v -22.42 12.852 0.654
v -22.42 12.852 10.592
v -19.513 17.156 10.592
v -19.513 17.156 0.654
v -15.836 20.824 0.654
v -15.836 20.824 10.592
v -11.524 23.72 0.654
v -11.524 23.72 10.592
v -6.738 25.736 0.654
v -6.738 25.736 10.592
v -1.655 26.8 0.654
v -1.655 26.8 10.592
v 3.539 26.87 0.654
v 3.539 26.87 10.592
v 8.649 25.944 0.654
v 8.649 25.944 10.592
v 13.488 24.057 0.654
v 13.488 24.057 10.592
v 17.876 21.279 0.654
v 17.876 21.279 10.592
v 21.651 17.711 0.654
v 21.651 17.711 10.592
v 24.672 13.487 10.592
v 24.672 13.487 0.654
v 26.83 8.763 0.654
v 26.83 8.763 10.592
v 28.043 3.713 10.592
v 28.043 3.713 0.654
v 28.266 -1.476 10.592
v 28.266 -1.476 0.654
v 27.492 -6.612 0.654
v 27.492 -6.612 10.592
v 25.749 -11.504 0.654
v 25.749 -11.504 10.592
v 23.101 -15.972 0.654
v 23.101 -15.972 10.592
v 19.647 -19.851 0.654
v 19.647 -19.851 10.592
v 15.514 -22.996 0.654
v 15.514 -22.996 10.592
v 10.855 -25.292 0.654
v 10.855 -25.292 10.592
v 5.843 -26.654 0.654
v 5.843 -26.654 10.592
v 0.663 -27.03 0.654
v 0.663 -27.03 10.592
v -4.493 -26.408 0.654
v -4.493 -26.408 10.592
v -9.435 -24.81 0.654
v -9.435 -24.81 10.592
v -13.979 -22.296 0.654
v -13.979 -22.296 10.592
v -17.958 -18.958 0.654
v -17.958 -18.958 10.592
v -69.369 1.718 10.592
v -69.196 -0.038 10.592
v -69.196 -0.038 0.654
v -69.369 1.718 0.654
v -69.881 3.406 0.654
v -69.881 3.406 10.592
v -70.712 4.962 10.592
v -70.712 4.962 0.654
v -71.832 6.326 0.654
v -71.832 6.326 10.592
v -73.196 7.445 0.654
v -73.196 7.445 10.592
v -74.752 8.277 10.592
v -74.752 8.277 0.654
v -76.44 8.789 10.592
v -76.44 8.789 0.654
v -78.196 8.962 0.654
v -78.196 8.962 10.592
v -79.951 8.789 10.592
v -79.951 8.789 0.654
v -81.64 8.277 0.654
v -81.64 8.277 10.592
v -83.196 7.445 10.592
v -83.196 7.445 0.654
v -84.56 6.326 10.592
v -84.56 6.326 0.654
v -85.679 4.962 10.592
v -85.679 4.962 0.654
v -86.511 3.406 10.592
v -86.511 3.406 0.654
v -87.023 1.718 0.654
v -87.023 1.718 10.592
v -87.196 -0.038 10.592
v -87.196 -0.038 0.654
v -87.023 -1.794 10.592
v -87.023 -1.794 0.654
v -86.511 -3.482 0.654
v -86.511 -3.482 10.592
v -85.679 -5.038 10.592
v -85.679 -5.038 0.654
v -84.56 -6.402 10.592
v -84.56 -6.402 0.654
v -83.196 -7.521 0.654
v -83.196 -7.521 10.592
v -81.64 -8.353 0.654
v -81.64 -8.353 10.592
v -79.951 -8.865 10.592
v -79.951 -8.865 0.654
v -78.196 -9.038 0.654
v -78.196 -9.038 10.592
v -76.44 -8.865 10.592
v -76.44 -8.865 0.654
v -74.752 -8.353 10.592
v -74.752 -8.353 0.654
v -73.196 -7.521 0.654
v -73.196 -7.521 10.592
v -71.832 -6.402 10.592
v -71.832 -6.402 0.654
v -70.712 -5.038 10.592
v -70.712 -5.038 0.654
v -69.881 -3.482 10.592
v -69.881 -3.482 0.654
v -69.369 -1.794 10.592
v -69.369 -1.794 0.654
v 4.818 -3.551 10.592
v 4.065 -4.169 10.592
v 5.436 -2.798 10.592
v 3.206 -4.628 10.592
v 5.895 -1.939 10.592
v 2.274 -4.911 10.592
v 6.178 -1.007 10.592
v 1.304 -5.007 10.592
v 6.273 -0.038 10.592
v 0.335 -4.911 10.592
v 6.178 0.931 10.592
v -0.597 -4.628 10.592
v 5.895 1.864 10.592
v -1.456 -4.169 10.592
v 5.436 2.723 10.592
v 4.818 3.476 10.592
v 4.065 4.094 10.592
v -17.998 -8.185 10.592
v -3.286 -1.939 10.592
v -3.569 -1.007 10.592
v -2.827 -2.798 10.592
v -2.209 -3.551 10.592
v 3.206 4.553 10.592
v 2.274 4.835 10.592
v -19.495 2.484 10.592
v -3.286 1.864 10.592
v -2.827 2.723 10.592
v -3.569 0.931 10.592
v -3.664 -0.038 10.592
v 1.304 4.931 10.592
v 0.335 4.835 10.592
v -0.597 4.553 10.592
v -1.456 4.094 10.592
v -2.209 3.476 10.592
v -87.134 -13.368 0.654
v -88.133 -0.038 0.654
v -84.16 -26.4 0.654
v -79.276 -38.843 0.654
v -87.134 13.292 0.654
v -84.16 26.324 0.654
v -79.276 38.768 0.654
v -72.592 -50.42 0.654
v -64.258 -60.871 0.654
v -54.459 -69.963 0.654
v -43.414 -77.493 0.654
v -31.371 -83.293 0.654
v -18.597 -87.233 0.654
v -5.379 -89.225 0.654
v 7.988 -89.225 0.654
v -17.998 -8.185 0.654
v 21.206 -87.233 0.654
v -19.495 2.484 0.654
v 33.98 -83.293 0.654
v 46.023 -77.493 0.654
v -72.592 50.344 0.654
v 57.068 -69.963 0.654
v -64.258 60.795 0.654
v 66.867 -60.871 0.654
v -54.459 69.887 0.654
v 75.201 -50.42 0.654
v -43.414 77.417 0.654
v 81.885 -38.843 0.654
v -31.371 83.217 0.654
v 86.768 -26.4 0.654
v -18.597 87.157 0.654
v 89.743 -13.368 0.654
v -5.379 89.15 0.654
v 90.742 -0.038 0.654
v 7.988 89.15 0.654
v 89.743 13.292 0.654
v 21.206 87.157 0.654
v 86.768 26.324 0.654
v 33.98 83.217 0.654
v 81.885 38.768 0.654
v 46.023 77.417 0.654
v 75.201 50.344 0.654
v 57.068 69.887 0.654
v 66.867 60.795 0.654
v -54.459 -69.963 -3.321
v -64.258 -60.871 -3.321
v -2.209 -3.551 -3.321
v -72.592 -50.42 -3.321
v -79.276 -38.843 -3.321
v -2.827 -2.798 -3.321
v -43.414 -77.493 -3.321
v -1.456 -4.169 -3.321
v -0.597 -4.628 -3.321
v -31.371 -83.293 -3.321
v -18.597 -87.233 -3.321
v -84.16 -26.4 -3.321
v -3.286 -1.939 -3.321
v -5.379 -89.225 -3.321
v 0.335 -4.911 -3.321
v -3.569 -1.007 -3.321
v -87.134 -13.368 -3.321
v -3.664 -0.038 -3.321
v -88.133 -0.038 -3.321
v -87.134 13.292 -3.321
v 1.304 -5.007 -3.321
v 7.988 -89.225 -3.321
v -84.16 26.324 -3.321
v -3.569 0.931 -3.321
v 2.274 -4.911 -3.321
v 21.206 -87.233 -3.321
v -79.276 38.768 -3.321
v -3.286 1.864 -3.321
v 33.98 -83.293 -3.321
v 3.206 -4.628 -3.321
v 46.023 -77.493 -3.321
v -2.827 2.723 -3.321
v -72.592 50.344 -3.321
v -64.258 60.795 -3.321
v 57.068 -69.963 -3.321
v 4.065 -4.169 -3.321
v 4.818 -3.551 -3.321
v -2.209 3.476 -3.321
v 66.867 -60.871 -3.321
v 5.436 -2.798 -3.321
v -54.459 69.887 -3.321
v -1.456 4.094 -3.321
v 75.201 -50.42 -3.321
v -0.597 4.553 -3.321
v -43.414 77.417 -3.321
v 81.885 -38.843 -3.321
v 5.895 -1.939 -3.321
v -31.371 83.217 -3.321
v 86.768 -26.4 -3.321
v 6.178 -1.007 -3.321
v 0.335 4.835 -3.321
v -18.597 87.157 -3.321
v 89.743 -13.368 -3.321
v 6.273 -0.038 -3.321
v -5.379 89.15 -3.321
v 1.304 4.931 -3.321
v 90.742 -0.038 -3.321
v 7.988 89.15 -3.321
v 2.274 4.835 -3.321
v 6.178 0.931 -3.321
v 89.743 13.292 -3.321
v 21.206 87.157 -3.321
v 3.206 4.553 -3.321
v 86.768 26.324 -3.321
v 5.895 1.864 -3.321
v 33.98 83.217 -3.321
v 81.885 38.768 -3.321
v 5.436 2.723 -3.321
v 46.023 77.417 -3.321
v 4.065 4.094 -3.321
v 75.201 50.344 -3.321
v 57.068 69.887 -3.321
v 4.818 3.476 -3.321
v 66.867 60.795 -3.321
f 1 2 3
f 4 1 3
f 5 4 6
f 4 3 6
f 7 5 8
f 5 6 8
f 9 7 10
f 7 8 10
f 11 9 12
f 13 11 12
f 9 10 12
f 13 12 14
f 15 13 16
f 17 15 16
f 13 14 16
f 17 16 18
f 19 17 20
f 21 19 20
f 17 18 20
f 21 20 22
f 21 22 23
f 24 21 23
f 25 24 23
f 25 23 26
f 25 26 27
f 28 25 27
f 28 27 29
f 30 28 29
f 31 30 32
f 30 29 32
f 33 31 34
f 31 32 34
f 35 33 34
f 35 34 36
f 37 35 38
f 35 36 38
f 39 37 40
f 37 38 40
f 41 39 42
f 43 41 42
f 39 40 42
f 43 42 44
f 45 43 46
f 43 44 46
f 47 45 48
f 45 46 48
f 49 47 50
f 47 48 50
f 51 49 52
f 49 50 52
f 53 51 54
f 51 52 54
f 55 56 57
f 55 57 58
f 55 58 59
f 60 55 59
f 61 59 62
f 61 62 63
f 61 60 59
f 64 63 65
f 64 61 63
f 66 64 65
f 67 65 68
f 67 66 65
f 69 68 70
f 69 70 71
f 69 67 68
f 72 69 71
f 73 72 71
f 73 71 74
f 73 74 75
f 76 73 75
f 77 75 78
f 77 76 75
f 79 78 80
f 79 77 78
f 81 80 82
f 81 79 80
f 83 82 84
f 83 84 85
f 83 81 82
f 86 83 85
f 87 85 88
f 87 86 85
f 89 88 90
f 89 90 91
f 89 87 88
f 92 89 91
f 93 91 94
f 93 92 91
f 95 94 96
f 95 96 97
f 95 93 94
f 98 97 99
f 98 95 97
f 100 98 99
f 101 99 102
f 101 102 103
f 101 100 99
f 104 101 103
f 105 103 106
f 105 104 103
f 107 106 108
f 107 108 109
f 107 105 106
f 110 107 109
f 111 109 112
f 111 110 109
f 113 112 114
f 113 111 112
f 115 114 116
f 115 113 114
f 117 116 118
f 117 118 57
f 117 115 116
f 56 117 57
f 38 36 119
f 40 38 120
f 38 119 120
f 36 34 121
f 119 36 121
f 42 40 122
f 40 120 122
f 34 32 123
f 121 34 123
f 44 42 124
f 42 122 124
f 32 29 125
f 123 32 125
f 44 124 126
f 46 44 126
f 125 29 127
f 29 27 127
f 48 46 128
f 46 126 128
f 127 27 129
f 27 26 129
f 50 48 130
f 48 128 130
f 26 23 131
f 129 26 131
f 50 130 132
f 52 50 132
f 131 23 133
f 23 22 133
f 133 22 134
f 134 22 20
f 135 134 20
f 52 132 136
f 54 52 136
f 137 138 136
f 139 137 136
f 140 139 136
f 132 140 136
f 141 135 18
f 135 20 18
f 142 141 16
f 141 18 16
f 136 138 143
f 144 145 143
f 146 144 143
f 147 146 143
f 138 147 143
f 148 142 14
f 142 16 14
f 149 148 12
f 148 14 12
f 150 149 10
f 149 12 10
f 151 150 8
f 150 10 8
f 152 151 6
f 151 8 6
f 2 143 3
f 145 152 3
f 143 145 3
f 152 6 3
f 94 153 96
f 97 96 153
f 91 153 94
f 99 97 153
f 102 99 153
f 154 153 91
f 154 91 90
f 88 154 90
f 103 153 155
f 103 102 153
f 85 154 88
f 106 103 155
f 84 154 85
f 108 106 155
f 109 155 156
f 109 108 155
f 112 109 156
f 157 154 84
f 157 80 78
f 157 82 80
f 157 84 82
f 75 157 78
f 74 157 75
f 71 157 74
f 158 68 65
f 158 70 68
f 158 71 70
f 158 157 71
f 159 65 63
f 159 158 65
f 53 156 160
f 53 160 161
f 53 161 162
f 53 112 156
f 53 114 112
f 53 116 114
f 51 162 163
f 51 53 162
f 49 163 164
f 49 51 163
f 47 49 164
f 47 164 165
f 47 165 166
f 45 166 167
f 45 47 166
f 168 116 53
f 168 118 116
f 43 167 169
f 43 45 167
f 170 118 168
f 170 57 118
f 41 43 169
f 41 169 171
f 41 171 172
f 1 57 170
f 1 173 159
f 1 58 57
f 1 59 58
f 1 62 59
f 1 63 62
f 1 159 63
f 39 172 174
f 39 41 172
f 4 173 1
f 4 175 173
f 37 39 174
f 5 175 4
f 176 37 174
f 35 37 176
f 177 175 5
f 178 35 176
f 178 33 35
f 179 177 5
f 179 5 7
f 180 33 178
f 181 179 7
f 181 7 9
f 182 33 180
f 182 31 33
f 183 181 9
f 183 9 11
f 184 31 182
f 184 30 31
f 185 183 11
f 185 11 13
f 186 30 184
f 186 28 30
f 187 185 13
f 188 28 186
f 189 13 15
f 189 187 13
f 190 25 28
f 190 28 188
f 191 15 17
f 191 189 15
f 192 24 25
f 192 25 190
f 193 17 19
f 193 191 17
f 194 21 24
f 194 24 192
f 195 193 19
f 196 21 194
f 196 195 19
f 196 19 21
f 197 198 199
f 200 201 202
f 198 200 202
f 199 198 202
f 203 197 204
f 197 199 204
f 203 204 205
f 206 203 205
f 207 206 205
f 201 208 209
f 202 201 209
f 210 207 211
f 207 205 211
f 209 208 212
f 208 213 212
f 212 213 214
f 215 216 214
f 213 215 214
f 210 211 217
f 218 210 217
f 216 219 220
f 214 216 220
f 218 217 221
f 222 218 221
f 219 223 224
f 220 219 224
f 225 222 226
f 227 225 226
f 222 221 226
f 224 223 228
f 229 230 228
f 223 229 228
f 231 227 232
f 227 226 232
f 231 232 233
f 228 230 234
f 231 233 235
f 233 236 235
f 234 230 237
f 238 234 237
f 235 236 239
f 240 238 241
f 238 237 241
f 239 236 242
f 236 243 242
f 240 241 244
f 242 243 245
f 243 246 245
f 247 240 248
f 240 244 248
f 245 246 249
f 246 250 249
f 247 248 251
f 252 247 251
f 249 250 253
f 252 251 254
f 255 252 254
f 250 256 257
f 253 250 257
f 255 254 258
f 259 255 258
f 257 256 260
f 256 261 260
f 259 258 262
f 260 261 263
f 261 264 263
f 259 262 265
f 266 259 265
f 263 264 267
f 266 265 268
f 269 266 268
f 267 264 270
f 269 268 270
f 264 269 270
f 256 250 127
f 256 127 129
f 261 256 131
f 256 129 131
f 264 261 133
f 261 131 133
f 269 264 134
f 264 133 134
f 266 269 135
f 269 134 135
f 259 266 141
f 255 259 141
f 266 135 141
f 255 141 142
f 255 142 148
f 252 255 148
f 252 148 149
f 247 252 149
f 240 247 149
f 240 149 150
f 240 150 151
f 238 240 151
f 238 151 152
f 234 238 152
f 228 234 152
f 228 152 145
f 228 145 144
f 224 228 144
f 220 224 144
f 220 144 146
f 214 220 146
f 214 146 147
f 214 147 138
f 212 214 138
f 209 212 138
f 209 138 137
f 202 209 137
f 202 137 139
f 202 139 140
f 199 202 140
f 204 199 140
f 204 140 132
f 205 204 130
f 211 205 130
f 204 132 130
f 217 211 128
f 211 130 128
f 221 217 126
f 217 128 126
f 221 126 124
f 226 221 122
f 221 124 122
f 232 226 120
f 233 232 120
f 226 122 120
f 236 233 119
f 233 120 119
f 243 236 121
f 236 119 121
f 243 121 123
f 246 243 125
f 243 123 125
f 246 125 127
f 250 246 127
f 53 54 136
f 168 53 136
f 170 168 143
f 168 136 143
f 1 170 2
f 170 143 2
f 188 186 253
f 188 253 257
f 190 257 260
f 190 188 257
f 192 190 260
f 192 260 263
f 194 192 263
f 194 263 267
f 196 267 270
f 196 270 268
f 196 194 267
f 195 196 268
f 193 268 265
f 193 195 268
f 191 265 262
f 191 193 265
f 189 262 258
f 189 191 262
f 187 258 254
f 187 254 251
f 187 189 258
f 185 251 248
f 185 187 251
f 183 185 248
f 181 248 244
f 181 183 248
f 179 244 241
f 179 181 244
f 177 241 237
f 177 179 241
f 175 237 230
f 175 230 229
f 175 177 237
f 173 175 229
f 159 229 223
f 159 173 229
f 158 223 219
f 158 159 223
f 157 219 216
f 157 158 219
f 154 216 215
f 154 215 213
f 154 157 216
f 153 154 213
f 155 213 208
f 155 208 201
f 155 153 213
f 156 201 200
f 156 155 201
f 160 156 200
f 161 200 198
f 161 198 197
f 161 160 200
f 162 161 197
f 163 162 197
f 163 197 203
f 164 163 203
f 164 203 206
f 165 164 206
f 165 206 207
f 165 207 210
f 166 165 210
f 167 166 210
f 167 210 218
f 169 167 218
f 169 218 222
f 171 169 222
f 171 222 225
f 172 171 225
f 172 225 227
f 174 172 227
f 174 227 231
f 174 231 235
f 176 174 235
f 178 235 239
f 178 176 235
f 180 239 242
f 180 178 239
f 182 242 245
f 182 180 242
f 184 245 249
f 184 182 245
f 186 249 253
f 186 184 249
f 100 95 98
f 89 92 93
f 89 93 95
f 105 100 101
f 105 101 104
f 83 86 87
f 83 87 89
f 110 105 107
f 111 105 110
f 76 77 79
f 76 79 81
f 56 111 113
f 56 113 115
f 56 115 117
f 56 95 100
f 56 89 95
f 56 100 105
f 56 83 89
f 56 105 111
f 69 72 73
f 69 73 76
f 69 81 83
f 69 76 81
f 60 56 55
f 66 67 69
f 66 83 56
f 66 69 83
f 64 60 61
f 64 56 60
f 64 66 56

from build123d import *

# Parameters (mm, degrees)
SKETCH_1_R      = 3.5775
SKETCH_1_R_2    = 0.19875
EXTRUDE_2_DEPTH = 0.159
EXTRUDE_START   = 0.3975
SKETCH_1_6_R    = 0.19875
SKETCH_1_6_R_2  = 0.36
EXTRUDE_3_DEPTH = 0.3975
SCALE_3_SCALE   = 25


with BuildPart() as part:
    # 草图1 → 凸台-拉伸2 (new body)
    with BuildSketch(Plane.XY):
        Circle(SKETCH_1_R)
        Circle(SKETCH_1_R_2, mode=Mode.SUBTRACT)
    extrude(amount=-EXTRUDE_2_DEPTH)

    # 草图1<6> → 凸台-拉伸3 (add)
    # profile 1 of 2: a face of its own
    with BuildSketch(Plane.XY.offset(EXTRUDE_START)):
        with BuildLine():
            ThreePointArc((-0.948975285, 0.515602472), (-0.794802322, -0.111488288), (-0.770493853, -0.756795363))
            ThreePointArc((-0.770493853, -0.756795363), (1.069529145, 0.150024692), (-0.948975285, 0.515602472))
        make_face()
        Circle(SKETCH_1_6_R, mode=Mode.SUBTRACT)
    # profile 2 of 2: a face of its own
    with BuildSketch(Plane.XY.offset(EXTRUDE_START)):
        with Locations((-3.18, 0)):
            Circle(SKETCH_1_6_R_2)
    extrude(amount=-EXTRUDE_3_DEPTH)


with BuildPart() as part_1:
    # 缩放比例3: scaled about (-0.054347158, 0.00157736, -0.027262254)
    add(part.part.scale(SCALE_3_SCALE).moved(Location((1.304331792, -0.03785664, 0.654294096))))


solid = part_1.part
